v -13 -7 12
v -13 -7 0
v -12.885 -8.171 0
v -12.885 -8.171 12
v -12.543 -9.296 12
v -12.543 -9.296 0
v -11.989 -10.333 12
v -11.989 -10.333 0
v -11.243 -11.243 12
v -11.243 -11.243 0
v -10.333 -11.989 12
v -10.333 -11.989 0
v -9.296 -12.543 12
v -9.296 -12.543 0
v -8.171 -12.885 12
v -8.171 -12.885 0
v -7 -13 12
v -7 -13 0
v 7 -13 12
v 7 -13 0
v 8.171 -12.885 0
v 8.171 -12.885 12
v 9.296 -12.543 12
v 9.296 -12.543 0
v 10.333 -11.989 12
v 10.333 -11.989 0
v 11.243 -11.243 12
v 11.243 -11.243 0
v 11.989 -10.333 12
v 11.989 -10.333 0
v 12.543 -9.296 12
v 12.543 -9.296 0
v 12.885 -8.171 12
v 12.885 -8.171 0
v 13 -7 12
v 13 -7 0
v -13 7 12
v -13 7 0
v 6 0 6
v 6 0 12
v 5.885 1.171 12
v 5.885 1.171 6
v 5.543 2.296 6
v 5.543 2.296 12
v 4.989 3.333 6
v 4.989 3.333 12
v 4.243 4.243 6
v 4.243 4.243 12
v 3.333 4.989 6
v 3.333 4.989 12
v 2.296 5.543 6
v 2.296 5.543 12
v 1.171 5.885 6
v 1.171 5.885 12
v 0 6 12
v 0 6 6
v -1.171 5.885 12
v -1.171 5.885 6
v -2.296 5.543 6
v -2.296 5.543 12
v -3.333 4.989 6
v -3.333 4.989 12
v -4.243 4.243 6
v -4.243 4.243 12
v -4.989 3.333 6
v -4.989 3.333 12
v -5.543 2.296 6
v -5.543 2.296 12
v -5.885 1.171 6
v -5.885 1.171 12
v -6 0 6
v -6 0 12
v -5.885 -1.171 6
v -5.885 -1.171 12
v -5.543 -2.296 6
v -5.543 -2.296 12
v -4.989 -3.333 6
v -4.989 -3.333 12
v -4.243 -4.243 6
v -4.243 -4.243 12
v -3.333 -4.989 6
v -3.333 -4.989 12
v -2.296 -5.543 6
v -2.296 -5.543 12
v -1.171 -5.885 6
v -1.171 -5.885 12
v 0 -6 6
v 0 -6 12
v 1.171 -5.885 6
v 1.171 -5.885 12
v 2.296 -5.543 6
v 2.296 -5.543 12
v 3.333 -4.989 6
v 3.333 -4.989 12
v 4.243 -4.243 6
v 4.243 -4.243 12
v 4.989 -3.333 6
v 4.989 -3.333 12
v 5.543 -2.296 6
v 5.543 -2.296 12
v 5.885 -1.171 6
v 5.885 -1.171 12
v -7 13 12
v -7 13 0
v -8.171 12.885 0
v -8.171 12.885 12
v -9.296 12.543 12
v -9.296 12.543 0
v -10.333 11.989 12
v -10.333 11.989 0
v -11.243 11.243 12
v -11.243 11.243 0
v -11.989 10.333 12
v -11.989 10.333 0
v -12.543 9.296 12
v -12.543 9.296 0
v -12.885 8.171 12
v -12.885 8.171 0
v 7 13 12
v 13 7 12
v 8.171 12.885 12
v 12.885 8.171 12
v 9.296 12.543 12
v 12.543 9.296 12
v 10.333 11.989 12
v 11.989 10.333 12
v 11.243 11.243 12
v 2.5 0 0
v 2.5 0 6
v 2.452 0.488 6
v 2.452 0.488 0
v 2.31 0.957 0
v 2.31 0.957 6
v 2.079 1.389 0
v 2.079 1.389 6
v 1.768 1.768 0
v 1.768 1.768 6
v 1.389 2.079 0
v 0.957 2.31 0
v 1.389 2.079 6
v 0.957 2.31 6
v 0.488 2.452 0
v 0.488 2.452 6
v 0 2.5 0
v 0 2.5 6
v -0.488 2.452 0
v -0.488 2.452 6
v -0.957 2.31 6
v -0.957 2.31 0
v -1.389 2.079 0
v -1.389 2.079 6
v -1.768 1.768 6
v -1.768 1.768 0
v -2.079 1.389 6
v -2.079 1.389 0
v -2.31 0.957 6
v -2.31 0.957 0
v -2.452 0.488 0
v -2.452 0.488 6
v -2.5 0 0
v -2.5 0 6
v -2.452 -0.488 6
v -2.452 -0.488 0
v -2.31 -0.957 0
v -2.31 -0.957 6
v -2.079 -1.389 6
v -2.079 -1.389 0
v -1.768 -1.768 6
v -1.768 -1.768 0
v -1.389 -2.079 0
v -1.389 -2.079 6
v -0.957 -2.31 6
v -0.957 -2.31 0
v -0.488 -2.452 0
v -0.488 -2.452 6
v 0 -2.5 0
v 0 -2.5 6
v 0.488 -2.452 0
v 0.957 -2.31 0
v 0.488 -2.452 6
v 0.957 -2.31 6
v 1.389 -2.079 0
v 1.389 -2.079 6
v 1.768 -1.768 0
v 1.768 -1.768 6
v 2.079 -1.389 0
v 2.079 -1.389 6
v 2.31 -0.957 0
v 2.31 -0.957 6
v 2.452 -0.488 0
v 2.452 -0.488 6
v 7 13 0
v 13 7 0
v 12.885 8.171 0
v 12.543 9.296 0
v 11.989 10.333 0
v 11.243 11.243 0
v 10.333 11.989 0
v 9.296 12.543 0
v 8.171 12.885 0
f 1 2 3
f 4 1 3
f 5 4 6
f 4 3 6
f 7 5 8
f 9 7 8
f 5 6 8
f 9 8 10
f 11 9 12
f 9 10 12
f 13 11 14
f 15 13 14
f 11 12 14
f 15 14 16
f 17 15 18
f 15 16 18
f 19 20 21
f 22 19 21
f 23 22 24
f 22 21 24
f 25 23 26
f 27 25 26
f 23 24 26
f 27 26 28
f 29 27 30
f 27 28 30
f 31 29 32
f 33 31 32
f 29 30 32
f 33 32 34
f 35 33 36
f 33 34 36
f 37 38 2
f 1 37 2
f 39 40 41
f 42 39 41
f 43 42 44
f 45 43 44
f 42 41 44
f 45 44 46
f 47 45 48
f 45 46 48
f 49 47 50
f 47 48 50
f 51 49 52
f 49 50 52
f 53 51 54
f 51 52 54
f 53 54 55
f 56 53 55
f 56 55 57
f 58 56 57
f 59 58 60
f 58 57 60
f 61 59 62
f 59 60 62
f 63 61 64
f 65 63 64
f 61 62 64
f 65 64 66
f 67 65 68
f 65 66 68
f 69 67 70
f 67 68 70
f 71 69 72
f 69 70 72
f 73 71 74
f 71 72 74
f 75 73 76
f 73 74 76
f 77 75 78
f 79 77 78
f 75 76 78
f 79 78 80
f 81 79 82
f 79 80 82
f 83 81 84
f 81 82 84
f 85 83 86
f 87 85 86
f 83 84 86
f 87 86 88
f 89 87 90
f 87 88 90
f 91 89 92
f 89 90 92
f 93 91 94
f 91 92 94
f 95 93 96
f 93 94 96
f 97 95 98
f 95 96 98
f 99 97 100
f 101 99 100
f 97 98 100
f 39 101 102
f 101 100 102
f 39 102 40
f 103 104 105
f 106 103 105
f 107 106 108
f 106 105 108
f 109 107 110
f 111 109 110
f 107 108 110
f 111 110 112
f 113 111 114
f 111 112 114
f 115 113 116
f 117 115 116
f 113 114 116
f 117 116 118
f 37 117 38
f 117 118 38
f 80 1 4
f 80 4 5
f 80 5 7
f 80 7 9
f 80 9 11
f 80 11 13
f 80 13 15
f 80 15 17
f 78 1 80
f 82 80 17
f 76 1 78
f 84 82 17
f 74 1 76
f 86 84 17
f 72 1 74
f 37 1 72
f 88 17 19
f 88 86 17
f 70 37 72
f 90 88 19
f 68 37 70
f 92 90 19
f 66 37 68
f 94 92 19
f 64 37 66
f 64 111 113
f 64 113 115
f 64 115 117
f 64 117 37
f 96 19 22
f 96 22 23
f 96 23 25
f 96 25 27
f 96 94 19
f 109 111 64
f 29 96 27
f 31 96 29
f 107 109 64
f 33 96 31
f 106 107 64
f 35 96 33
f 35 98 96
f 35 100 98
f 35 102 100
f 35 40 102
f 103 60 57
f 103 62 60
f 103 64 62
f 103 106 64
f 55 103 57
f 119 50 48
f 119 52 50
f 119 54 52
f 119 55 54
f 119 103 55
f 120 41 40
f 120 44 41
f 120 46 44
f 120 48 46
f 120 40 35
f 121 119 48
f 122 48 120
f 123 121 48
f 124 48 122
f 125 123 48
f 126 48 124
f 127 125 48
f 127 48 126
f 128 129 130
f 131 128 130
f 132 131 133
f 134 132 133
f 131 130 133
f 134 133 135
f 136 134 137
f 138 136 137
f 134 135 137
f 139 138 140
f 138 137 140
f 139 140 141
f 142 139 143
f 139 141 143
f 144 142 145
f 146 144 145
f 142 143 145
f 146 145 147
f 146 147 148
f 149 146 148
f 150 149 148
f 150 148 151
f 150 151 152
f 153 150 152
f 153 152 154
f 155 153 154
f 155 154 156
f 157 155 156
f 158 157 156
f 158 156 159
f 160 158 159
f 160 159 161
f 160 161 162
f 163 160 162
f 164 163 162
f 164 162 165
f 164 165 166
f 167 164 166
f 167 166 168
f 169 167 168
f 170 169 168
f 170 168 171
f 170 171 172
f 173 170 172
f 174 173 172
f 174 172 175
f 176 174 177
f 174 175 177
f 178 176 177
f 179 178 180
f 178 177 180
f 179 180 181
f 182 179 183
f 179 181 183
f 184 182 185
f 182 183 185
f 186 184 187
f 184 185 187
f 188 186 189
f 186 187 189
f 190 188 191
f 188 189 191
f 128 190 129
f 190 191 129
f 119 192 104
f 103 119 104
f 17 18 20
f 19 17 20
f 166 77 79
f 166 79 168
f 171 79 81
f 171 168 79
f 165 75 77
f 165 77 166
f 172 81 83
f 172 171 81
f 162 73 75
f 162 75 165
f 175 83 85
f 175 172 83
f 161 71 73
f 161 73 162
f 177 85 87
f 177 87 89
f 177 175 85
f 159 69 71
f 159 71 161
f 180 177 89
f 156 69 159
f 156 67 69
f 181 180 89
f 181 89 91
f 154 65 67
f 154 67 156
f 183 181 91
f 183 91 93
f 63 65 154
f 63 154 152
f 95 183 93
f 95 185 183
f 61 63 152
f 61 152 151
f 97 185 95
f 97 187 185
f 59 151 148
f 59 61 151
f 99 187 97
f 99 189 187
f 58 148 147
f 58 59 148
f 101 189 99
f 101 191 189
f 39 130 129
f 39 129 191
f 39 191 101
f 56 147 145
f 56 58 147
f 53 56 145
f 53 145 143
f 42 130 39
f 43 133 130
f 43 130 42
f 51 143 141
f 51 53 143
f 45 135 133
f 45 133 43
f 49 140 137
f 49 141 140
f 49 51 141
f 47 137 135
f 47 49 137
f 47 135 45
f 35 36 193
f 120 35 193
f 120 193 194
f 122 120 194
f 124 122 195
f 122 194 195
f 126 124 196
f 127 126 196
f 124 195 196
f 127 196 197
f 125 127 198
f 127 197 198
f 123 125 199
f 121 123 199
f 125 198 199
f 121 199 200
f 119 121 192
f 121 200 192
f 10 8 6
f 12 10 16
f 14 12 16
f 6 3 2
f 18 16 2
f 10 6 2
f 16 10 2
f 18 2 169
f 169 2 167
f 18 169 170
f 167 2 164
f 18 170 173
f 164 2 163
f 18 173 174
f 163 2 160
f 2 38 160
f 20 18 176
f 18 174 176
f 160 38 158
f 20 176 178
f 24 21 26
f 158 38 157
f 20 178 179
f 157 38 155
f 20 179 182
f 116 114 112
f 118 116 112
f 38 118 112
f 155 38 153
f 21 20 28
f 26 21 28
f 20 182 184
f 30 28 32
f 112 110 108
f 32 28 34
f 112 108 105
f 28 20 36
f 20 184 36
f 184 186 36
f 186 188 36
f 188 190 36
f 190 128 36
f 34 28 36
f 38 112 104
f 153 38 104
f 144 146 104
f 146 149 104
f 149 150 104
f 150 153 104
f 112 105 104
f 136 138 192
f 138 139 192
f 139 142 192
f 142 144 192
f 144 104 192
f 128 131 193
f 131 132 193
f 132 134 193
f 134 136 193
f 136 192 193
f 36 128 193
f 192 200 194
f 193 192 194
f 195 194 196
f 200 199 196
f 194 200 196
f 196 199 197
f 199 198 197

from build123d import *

# Parameters (mm, degrees)
F1_DEPTH = 12
F2_R     = 6
F3_DEPTH = 6
F4_R     = 2.5
F5_DEPTH = 31.5


with BuildPart() as f1:
    # F0 (on Top) → F1 (new body)
    with BuildSketch(Plane.XY):
        with BuildLine():
            Line((-7, -13), (7, -13))
            ThreePointArc((7, -13), (11.242641, -11.242641), (13, -7))
            Line((13, -7), (13, 7))
            ThreePointArc((13, 7), (11.242641, 11.242641), (7, 13))
            Line((7, 13), (-7, 13))
            ThreePointArc((-7, 13), (-11.242641, 11.242641), (-13, 7))
            Line((-13, 7), (-13, -7))
            ThreePointArc((-13, -7), (-11.242641, -11.242641), (-7, -13))
        make_face()
    extrude(amount=F1_DEPTH)

    # F2 (on face) → F3 (cut)
    with BuildSketch(Plane.XY.offset(12)):
        Circle(F2_R)
    extrude(amount=-F3_DEPTH, mode=Mode.SUBTRACT)

    # F4 (on face) → F5 (cut)
    with BuildSketch(Plane.XY.offset(6)):
        Circle(F4_R)
    extrude(amount=-F5_DEPTH, mode=Mode.SUBTRACT)


solid = f1.part
